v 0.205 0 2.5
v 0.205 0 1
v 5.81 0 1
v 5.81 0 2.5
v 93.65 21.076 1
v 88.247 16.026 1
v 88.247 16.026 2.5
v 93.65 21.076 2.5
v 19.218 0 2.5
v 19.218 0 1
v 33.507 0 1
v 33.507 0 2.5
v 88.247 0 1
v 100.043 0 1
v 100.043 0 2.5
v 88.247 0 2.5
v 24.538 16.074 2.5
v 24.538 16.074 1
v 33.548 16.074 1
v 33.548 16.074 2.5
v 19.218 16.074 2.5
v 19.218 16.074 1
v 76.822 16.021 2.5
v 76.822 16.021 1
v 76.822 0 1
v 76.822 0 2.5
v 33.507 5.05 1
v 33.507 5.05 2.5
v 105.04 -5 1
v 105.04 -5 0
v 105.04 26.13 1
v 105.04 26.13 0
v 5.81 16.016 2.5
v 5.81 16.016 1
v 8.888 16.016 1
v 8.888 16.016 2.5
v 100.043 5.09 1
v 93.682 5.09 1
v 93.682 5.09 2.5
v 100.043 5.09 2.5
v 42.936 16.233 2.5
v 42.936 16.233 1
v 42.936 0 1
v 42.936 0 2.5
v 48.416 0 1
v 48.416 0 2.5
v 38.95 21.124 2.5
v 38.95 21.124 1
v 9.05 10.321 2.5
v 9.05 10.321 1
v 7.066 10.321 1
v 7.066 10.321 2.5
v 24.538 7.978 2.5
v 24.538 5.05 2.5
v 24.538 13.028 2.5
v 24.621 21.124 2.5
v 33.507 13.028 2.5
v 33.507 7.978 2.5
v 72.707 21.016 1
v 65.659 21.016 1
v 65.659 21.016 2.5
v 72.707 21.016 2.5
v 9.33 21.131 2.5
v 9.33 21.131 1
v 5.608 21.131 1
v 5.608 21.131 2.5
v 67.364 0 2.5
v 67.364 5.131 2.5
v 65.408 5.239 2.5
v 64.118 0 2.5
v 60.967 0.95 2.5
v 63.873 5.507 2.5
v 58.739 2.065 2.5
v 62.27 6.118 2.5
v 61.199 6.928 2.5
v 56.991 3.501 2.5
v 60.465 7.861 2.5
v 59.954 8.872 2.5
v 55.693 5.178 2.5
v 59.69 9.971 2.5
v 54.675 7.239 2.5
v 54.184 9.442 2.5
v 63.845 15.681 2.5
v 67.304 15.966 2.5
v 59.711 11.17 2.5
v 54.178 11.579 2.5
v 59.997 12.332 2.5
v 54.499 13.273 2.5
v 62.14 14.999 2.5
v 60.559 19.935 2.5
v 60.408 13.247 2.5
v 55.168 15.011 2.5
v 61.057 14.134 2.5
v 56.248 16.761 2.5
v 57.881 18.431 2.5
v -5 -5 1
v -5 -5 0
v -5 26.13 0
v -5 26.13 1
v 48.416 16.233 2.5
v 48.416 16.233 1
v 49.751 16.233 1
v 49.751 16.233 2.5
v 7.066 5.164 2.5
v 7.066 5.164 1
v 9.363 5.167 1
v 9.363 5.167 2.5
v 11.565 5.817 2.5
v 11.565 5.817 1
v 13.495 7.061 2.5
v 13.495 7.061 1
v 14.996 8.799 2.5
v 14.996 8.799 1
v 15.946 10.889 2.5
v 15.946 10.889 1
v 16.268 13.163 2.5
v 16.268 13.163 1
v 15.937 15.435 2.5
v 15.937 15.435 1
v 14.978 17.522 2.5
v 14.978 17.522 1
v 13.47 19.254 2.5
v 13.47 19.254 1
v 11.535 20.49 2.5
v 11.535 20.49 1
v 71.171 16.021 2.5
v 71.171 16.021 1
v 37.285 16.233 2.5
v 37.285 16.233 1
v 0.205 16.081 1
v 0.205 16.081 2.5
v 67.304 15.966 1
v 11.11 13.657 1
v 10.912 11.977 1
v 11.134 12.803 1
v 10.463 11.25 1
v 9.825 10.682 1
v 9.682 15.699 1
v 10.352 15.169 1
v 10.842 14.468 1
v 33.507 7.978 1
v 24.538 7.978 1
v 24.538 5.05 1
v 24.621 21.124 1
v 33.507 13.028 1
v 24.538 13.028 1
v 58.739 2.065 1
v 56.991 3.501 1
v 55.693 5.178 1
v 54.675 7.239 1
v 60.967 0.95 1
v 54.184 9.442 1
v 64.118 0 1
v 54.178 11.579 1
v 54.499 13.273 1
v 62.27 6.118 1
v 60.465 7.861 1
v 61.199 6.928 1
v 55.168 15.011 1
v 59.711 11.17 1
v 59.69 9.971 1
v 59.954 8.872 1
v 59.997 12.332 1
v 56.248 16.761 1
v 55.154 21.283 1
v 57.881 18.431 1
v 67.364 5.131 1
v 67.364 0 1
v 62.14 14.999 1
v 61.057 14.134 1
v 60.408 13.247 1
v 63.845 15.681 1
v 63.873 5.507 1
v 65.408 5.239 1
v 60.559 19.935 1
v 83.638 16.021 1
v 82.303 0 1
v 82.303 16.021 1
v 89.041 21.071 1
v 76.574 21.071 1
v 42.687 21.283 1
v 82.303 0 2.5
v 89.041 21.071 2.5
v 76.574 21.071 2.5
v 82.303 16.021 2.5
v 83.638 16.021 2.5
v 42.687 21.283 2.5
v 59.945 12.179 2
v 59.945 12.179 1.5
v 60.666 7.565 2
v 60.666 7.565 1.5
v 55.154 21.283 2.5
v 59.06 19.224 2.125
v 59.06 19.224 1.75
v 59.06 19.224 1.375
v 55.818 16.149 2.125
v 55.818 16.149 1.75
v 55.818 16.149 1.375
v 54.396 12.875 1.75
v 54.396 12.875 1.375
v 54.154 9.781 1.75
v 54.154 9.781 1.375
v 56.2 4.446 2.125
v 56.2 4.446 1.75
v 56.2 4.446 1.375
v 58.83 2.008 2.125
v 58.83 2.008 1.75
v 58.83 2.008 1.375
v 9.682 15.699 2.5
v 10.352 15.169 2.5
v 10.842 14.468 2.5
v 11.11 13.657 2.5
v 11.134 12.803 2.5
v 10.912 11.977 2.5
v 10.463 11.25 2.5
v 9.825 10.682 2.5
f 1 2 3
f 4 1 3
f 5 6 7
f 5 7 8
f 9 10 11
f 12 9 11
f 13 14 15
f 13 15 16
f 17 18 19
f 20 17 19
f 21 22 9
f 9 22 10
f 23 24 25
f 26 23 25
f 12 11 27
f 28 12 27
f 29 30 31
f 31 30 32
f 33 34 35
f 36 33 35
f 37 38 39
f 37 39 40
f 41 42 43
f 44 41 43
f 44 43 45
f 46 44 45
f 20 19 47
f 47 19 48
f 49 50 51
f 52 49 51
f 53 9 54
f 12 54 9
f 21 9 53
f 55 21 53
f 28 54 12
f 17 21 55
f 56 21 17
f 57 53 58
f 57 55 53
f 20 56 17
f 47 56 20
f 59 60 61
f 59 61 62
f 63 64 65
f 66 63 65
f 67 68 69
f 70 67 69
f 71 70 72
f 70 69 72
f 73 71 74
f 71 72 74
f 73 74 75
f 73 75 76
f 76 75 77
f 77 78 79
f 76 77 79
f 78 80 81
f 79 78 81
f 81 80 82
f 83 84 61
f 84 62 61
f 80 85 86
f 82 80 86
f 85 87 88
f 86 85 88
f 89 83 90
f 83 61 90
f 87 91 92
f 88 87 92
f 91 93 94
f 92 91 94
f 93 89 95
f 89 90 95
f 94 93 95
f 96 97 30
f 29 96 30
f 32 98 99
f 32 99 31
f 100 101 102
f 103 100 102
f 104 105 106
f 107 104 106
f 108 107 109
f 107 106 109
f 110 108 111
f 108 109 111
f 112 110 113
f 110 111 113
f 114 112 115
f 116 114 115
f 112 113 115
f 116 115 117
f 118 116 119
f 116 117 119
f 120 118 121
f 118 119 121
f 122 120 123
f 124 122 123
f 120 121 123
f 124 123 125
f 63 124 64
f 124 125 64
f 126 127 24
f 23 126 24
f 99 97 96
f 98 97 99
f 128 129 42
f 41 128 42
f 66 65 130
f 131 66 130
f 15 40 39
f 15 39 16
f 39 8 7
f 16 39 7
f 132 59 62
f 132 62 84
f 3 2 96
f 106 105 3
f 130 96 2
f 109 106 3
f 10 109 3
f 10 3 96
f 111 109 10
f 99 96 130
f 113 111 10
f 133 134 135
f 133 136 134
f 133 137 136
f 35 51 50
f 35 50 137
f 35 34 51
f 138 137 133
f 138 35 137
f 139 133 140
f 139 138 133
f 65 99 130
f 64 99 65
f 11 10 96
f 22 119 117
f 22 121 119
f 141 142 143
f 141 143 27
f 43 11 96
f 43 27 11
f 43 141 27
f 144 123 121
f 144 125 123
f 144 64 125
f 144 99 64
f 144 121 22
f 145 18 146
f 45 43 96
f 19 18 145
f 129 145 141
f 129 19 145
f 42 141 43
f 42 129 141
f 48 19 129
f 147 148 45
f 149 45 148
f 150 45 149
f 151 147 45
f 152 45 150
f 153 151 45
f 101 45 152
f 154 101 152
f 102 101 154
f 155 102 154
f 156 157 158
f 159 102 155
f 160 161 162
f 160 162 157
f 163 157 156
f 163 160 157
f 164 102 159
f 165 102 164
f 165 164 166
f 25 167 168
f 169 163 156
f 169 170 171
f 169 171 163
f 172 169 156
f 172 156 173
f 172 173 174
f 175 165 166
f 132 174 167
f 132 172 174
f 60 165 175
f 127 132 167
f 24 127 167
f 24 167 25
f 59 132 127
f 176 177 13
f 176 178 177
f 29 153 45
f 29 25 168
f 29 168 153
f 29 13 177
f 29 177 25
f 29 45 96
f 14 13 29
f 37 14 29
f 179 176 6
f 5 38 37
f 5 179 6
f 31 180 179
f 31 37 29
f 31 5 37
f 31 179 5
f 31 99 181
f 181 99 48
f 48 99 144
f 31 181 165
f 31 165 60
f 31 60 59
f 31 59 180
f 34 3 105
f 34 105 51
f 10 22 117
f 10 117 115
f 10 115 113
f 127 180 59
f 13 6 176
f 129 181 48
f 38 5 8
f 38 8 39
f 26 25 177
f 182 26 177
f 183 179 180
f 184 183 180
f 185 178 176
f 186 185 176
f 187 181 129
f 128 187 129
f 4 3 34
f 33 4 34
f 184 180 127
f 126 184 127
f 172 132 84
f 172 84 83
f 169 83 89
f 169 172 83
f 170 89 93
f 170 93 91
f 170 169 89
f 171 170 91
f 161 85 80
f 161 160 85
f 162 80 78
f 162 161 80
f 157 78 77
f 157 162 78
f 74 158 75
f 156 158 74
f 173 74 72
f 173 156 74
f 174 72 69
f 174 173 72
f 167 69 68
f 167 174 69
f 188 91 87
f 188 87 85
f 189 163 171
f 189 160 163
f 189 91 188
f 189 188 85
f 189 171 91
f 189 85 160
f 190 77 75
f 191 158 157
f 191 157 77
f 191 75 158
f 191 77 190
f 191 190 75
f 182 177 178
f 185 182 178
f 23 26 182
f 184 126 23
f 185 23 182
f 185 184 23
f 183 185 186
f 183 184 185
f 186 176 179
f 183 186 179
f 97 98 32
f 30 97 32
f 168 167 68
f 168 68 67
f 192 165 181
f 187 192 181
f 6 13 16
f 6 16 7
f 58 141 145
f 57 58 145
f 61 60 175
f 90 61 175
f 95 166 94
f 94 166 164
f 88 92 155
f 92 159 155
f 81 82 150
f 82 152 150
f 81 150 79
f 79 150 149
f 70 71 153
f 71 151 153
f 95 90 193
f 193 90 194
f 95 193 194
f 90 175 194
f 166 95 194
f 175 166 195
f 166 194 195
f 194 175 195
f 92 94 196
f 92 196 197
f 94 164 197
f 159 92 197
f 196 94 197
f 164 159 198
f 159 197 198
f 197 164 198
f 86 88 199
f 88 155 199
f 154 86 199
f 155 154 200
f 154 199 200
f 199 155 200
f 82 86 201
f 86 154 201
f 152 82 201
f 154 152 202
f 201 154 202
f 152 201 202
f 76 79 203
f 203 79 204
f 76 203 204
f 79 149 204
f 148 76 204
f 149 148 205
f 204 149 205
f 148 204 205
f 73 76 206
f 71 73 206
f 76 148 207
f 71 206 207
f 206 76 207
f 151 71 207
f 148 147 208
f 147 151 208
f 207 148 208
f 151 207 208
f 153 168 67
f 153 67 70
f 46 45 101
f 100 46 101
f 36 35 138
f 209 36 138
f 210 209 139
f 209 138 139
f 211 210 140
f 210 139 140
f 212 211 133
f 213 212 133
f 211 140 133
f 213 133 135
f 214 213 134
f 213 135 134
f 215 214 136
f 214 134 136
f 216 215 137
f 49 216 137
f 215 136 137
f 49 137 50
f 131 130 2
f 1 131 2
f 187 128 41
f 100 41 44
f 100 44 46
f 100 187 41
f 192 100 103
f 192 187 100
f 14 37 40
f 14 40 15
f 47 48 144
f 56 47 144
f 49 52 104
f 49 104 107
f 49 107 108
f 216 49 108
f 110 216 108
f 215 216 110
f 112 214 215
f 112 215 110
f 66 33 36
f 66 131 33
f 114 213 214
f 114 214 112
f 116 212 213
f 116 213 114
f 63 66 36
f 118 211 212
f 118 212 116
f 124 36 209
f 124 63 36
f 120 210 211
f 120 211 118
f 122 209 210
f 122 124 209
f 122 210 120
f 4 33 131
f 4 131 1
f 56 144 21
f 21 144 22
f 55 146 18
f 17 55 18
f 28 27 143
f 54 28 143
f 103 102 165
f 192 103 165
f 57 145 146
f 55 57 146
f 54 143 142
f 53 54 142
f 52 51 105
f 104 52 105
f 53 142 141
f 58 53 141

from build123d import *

# Parameters (mm, degrees)
SKETCH_W     = 110.04
SKETCH_H     = 31.13
PAD_DEPTH    = 1
PAD001_DEPTH = 1.5


with BuildPart() as part:
    # Sketch → Pad (new body)
    with BuildSketch(Plane.XY):
        with Locations((50.02, 10.565)):
            Rectangle(SKETCH_W, SKETCH_H)
    extrude(amount=PAD_DEPTH)

    # Sketch001 → Pad001 (join)
    with BuildSketch(Plane.XY.offset(1)):
        with BuildLine():
            Line((9.050295, 10.321073), (7.066321, 10.321073))
            Line((7.066321, 10.321073), (7.066321, 5.163982))
            ThreePointArc((7.066321, 5.163982), (16.188383, 12.014691), (9.330203, 21.131137))
            Line((9.330203, 21.131137), (5.608163, 21.131137))
            Line((5.608163, 21.131137), (0.205283, 16.081137))
            Line((0.205283, 16.081137), (0.205283, 0))
            Line((0.205283, 0), (5.809592, 0))
            Line((5.809592, 0), (5.809592, 16.015693))
            Line((5.809592, 16.015693), (8.888276, 16.015693))
            ThreePointArc((8.888276, 16.015693), (11.152955, 13.230511), (9.050295, 10.321073))
        make_face()
        with BuildLine():
            add(Edge.make_bspline(
                [(67.303898, 15.965996), (62.098309, 16.191984), (58.974827, 11.8324), (60.112492, 7.371485), (63.086761, 5.170527), (67.363525, 5.130735)],
                knots=[0, 0, 0, 0, 0.333333, 0.666667, 1, 1, 1, 1], degree=3))
            Line((67.363525, 5.130735), (67.363525, 0))
            Line((67.363525, 0), (64.118454, 0))
            add(Edge.make_bspline(
                [(65.6586, 21.015996), (59.749424, 20.528551), (54.754429, 16.165611), (53.644032, 9.523063), (55.59515, 4.427975), (59.316757, 1.105113), (64.118454, 0)],
                knots=[0, 0, 0, 0, 0.25, 0.5, 0.75, 1, 1, 1, 1], degree=3))
            Line((65.6586, 21.015996), (72.706779, 21.015996))
            Line((72.706779, 21.015996), (67.303898, 15.965996))
        make_face()
        Polygon((38.950399, 21.12416), (24.620772, 21.12416), (19.217891, 16.07416), (19.217891, 0), (33.507112, 0), (33.507112, 5.05), (24.537624, 5.05), (24.537624, 7.978263), (33.507112, 7.978263), (33.507112, 13.028263), (24.537624, 13.028263), (24.537624, 16.07416), (33.547518, 16.07416), align=None)
        Polygon((42.687428, 21.282697), (37.284547, 16.232697), (42.935597, 16.232697), (42.935597, 0), (48.416265, 0), (48.416265, 16.232697), (49.751421, 16.232697), (55.154302, 21.282697), align=None)
        Polygon((76.574252, 21.071087), (71.171371, 16.021087), (76.822421, 16.021087), (76.822421, 0), (82.303089, 0), (82.303089, 16.021087), (83.638245, 16.021087), (89.041126, 21.071087), align=None)
        Polygon((88.247359, 16.026386), (93.65024, 21.076386), (93.682304, 5.090163), (100.043274, 5.090163), (100.043274, 0), (88.247359, 0), align=None)
    extrude(amount=PAD001_DEPTH)


solid = part.part
